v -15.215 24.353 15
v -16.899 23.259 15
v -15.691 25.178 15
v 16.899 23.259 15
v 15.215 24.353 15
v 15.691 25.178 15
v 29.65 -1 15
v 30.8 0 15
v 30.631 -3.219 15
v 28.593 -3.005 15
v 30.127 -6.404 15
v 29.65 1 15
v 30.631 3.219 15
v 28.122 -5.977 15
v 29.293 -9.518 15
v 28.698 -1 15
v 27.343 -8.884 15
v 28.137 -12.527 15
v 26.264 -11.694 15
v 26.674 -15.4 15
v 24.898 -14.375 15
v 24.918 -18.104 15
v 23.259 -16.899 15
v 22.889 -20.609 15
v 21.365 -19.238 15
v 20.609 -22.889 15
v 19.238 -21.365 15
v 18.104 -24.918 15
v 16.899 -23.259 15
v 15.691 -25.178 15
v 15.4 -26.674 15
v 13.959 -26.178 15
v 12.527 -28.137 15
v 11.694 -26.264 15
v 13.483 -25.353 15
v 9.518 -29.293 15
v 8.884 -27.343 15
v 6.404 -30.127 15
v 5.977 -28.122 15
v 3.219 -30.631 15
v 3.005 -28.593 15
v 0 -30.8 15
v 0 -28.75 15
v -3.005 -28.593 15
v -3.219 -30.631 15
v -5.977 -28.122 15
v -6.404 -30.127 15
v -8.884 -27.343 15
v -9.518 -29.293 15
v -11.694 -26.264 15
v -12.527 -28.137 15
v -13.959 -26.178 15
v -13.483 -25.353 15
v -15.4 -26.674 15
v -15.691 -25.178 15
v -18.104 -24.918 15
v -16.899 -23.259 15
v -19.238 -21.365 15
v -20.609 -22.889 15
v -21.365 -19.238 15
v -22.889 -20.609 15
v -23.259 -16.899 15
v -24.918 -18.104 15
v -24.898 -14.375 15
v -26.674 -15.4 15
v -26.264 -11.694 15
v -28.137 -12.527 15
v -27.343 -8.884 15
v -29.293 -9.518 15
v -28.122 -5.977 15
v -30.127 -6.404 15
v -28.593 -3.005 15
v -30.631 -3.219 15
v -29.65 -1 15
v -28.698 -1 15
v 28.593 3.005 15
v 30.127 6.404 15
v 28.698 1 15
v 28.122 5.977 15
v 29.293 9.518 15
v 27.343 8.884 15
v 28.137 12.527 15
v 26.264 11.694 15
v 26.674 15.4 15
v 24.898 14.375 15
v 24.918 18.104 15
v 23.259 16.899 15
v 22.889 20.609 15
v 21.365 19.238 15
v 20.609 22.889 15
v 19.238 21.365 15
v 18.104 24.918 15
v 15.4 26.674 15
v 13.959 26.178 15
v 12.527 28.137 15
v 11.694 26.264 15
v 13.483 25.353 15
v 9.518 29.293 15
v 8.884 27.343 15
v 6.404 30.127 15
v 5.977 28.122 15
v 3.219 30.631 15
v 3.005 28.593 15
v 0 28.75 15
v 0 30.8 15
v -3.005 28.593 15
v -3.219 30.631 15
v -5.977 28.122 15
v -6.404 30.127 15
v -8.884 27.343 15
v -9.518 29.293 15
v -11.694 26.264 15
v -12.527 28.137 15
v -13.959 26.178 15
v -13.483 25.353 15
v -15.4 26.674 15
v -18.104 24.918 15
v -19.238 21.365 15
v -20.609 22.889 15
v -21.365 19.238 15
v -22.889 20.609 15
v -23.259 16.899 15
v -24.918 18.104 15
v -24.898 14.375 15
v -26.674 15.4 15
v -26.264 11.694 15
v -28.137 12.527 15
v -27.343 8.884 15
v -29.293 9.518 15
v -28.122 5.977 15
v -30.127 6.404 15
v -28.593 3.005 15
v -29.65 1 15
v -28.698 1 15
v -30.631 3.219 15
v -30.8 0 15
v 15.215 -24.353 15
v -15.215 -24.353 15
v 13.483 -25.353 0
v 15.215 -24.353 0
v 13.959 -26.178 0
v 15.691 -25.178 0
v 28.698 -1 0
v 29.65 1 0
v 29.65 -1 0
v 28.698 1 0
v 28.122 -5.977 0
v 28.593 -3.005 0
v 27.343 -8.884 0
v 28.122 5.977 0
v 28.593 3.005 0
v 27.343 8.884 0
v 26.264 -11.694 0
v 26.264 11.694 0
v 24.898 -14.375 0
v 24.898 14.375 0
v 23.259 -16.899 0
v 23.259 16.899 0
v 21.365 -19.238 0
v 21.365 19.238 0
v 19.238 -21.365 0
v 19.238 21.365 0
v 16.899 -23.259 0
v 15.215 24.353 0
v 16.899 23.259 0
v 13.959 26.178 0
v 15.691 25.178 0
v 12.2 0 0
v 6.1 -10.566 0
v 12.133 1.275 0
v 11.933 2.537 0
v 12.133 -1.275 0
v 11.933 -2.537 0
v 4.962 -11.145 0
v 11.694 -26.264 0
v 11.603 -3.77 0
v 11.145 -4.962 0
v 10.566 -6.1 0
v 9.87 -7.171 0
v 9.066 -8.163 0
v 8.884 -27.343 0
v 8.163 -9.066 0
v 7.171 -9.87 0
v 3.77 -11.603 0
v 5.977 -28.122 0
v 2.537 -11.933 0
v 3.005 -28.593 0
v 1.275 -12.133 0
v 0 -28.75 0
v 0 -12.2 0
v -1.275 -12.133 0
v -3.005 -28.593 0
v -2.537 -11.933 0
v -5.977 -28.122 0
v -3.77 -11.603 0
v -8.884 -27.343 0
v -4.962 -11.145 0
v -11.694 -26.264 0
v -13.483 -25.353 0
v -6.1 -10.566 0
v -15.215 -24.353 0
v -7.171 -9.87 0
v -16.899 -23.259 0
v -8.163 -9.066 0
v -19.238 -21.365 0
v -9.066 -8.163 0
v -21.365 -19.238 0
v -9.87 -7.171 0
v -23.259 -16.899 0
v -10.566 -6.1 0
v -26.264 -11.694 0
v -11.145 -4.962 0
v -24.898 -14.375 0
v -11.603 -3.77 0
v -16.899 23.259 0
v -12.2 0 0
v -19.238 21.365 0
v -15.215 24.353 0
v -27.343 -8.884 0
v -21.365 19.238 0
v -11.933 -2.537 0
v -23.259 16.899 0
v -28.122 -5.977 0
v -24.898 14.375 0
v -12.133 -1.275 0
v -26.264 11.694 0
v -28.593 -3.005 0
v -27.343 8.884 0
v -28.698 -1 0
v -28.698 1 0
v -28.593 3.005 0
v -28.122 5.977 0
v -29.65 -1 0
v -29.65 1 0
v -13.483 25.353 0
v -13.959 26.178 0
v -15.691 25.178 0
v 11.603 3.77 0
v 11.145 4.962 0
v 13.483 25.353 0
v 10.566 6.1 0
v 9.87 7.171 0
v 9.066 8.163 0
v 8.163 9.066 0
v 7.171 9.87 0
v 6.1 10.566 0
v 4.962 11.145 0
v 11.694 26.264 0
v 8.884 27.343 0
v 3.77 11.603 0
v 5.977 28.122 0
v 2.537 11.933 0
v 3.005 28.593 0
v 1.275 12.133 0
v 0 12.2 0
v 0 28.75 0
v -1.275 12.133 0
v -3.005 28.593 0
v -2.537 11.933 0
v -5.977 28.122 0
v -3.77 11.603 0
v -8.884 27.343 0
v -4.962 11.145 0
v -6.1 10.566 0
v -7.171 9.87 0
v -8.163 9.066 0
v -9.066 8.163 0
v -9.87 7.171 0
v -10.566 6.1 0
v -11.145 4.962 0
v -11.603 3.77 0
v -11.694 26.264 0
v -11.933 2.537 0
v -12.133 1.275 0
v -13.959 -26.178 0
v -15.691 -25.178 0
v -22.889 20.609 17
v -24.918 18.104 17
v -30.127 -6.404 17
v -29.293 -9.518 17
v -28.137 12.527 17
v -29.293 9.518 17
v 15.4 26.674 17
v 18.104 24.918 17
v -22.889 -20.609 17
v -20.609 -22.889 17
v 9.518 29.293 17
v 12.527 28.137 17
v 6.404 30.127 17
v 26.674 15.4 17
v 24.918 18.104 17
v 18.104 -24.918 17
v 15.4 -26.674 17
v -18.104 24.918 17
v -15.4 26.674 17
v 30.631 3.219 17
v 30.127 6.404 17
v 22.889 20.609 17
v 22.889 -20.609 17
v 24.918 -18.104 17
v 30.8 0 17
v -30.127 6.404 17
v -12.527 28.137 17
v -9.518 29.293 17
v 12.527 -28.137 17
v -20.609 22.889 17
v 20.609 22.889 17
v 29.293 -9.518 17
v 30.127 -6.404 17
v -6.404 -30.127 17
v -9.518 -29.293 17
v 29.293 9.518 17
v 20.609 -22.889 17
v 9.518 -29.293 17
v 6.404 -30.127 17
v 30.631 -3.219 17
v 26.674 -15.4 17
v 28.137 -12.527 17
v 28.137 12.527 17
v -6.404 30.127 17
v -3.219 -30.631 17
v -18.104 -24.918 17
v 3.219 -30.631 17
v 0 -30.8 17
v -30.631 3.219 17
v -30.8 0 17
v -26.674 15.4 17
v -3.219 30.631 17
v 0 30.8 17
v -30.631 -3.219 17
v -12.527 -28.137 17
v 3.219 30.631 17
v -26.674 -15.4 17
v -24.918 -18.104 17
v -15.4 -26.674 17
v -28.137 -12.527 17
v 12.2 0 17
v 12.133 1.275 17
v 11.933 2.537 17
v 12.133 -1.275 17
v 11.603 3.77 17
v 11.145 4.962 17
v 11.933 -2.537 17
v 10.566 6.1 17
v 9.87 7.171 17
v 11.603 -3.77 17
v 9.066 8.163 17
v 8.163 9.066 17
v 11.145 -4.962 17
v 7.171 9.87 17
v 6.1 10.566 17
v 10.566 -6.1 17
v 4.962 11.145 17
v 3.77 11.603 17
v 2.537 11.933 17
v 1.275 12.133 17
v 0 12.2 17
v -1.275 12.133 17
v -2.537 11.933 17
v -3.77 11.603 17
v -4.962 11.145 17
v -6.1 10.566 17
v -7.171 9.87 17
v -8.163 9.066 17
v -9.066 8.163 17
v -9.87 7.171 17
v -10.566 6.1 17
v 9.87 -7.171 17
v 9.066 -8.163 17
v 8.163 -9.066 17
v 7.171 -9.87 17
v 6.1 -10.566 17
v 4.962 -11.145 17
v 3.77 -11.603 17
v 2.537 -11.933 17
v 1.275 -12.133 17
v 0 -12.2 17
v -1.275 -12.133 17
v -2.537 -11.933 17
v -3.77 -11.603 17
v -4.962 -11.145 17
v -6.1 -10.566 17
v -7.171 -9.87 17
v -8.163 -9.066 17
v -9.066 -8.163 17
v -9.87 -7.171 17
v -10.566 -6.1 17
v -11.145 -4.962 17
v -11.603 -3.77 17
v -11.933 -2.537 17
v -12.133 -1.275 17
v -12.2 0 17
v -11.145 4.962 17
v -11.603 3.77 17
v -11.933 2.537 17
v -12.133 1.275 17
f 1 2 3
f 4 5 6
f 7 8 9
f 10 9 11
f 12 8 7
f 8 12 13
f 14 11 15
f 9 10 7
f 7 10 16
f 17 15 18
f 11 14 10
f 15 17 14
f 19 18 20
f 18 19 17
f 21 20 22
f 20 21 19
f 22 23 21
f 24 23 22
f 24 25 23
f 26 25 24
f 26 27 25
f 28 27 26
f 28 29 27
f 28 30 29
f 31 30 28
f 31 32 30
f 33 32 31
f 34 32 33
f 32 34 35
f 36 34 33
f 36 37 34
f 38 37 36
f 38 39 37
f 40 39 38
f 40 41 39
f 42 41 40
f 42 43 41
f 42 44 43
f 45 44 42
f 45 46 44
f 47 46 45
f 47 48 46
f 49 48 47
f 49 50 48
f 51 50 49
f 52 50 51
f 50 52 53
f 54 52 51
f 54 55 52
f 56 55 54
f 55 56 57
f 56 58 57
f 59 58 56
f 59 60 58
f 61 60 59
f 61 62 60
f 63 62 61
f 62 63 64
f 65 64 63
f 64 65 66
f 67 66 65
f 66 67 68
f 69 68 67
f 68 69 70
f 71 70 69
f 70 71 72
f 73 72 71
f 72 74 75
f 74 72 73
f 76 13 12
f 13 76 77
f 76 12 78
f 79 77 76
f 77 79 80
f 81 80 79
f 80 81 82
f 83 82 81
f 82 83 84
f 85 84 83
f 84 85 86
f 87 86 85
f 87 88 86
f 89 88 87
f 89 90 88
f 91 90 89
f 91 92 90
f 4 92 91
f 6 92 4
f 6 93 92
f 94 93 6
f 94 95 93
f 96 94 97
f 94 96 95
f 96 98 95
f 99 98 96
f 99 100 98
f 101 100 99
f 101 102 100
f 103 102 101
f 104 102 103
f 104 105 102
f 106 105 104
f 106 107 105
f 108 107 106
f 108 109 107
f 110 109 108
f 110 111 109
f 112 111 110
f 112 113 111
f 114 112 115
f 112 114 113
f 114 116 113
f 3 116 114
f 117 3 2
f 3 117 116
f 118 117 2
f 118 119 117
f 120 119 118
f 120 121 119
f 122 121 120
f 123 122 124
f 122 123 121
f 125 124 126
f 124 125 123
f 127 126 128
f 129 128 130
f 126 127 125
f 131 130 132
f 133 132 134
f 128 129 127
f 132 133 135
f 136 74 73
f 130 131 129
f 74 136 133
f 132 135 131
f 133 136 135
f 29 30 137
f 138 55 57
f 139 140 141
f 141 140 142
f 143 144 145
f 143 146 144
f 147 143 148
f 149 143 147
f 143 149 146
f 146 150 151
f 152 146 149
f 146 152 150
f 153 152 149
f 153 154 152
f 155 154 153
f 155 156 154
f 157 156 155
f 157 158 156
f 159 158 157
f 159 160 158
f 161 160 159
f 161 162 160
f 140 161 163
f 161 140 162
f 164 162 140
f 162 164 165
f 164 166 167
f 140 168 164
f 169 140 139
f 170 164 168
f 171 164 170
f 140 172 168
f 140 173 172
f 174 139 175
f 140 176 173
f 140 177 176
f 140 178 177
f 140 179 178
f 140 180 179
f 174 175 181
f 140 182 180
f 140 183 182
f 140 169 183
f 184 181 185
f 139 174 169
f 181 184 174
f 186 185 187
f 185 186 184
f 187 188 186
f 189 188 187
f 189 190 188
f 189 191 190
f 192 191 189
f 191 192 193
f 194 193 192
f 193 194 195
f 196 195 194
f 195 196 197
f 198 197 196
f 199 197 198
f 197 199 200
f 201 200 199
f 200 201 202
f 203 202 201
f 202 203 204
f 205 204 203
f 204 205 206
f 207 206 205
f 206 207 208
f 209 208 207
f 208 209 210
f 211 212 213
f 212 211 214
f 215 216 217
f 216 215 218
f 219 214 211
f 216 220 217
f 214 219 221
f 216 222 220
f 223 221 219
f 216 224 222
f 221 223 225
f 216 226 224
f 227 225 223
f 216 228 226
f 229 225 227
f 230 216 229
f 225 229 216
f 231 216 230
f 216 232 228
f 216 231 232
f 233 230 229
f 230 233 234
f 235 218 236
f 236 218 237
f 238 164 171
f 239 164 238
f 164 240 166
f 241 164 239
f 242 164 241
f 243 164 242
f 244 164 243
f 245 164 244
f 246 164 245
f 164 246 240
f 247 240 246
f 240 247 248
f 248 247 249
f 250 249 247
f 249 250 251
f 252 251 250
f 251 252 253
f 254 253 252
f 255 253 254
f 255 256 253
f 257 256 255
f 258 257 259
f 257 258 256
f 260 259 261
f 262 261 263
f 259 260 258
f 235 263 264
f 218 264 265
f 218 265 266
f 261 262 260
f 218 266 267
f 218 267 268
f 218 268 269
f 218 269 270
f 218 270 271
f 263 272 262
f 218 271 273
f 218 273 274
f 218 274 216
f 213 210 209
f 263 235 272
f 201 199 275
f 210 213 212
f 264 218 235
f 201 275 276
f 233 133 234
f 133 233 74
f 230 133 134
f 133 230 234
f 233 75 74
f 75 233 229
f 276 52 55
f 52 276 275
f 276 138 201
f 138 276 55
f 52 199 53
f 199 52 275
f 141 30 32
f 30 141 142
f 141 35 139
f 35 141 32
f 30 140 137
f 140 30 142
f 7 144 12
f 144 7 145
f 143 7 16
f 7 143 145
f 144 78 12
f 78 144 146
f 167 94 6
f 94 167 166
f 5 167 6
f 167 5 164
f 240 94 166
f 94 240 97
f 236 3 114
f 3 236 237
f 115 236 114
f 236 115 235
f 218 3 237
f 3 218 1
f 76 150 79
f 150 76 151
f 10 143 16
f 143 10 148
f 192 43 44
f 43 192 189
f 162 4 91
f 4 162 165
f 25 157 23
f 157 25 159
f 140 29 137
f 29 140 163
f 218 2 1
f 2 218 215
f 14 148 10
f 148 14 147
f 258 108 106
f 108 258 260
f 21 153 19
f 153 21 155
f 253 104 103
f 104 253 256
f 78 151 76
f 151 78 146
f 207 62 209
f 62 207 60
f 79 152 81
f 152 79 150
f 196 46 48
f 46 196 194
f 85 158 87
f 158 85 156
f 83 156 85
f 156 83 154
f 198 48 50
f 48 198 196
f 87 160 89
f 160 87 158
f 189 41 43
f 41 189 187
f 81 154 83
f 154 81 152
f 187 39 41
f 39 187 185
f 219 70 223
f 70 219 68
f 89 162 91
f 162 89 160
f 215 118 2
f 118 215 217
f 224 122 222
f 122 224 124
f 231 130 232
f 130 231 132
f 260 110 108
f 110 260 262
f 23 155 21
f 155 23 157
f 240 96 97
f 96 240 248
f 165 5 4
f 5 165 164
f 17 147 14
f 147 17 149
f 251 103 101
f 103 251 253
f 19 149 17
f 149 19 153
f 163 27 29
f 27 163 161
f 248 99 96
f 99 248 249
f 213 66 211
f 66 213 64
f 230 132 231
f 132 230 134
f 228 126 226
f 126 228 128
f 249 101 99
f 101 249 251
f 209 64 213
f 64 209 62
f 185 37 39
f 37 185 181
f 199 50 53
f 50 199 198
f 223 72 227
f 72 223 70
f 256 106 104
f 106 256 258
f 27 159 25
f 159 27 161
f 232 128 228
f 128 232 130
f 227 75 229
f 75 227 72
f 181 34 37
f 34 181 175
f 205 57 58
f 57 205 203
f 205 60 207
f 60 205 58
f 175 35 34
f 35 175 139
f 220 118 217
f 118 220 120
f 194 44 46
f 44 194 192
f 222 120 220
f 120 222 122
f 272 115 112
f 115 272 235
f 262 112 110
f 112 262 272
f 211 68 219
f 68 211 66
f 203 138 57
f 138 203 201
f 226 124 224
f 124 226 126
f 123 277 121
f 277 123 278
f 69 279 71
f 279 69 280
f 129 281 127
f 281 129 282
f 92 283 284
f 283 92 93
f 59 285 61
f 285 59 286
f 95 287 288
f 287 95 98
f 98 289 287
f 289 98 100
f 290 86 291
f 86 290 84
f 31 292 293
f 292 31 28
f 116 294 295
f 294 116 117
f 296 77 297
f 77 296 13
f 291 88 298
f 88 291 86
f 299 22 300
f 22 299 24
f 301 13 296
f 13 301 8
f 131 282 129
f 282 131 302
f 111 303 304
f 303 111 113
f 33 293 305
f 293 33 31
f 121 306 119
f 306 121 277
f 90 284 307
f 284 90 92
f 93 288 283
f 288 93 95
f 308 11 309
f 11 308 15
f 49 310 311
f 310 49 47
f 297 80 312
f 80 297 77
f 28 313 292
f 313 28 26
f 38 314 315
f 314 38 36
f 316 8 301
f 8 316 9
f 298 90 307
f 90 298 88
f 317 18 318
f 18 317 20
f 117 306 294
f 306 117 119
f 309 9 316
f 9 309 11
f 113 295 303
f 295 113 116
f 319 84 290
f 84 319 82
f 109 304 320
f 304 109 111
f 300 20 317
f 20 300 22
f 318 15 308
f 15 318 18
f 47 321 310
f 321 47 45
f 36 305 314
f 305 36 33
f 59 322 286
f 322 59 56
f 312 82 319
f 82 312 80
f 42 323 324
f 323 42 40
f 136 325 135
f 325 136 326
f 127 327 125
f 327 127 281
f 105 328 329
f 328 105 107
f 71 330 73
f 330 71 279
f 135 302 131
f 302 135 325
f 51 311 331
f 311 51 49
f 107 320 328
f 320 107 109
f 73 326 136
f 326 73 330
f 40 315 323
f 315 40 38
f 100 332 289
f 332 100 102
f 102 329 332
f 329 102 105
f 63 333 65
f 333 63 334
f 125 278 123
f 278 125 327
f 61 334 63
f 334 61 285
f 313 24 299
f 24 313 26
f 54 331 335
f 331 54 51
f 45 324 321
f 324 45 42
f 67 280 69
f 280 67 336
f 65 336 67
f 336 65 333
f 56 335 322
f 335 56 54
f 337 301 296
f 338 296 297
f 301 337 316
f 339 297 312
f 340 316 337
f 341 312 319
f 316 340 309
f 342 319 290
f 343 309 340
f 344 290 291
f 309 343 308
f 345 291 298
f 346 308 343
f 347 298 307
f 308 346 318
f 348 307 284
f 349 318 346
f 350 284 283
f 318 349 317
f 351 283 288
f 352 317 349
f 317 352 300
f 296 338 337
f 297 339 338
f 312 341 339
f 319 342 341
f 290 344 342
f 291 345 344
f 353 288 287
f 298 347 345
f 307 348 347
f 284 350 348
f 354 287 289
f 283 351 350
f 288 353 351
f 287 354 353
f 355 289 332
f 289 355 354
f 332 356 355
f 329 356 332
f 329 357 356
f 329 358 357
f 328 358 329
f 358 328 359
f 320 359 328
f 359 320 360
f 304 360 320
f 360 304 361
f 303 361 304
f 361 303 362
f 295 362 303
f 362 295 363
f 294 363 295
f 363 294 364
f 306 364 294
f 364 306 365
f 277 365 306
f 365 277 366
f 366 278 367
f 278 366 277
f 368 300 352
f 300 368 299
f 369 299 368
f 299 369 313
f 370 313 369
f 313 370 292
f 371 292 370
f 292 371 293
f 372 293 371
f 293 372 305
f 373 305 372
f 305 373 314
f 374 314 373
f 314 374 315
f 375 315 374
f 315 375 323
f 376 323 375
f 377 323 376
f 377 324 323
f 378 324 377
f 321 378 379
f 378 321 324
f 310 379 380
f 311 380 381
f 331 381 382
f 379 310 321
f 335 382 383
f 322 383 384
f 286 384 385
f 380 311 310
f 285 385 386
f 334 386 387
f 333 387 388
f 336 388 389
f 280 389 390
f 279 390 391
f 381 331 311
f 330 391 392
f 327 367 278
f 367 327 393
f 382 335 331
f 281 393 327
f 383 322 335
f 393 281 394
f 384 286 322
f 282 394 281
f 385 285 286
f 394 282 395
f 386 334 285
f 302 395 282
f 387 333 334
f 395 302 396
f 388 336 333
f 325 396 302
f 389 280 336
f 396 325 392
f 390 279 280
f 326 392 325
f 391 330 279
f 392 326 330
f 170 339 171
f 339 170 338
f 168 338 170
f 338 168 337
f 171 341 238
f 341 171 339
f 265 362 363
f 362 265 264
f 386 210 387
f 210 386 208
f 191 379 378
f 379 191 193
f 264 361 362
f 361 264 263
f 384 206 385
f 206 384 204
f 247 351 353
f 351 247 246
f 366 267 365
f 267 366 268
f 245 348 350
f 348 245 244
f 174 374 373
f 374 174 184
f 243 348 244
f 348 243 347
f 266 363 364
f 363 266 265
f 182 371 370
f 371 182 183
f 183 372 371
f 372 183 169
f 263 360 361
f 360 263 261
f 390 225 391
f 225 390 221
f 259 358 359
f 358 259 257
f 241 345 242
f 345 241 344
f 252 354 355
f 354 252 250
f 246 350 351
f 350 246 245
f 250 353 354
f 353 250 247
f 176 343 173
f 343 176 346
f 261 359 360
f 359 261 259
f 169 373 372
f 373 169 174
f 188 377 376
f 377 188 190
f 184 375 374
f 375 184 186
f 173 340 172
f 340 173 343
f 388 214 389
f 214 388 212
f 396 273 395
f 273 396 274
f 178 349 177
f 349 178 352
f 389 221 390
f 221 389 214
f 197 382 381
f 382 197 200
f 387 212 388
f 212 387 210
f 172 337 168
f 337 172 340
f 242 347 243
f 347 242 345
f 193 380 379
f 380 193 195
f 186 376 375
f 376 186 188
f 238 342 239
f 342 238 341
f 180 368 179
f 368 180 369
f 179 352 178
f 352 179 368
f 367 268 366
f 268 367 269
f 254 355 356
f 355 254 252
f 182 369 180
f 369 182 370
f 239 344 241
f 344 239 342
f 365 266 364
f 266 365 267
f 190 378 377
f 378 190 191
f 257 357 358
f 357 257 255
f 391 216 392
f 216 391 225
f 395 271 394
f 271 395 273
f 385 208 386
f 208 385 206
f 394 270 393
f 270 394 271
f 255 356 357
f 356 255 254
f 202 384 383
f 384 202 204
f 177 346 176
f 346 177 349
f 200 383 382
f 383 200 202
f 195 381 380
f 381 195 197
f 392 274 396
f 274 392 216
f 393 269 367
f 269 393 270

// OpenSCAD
// A Base for Solar Lights what my wife bought from Large SuperMarket
// By Zilizii
// Idea from : http://www.thingiverse.com/thing:78398
// this shall be printed upside down...


//Diameter of the male part
D=28;	
	
//Height of the male part, most pieces are around D=H 
H=2; 		

//Height of the base in mm
H2 = 15; 			

//Diameter of the base in mm - measured and adjusted based on many measurements
D2 = 57.5; 			

//How much the ribs/male part come past the given diameter D
tolerance = 0.9;	

//How far the ribs come out from the first diameter
delta=0.5;		

//Bore diameter 1/4"=6.35 mm for landscaping stake
B=24; 			

Resolution = 60; //internal variable for resolution of rendering
$fn=Resolution; 

number_of_ribs = 6;

rib_thickness = 2;

difference(){ 	//remove the bore from...
	union() {		//add the male part, base and ribs
		cylinder(h=H2, r=D2/2);		 //base
		ribs(number_of_ribs);        //ribs, defined below
        translate([0,0,H2]) cylinder(h=H, r=(D2+tolerance*4+delta)/2);	
		}
        cylinder(h=H+H2, r=(B+tolerance-delta)/2); // add extra base to not too fall in the tube
	}

module ribs(n){ //creates n ribs spaced axially around the bore, extending tolerance beyond D/2
	R=D2/2+tolerance;
	thickness = rib_thickness;
	if (n > 0){	//if you dont put this in, and call ribs(0)
		for ( i = [0 : 5] ){
    			rotate( i * 360 / n, [0, 0, 1])
    			translate([-R, -thickness/2, 0]) 
			cube([R, thickness, H2]);
			}
	}
}




			
